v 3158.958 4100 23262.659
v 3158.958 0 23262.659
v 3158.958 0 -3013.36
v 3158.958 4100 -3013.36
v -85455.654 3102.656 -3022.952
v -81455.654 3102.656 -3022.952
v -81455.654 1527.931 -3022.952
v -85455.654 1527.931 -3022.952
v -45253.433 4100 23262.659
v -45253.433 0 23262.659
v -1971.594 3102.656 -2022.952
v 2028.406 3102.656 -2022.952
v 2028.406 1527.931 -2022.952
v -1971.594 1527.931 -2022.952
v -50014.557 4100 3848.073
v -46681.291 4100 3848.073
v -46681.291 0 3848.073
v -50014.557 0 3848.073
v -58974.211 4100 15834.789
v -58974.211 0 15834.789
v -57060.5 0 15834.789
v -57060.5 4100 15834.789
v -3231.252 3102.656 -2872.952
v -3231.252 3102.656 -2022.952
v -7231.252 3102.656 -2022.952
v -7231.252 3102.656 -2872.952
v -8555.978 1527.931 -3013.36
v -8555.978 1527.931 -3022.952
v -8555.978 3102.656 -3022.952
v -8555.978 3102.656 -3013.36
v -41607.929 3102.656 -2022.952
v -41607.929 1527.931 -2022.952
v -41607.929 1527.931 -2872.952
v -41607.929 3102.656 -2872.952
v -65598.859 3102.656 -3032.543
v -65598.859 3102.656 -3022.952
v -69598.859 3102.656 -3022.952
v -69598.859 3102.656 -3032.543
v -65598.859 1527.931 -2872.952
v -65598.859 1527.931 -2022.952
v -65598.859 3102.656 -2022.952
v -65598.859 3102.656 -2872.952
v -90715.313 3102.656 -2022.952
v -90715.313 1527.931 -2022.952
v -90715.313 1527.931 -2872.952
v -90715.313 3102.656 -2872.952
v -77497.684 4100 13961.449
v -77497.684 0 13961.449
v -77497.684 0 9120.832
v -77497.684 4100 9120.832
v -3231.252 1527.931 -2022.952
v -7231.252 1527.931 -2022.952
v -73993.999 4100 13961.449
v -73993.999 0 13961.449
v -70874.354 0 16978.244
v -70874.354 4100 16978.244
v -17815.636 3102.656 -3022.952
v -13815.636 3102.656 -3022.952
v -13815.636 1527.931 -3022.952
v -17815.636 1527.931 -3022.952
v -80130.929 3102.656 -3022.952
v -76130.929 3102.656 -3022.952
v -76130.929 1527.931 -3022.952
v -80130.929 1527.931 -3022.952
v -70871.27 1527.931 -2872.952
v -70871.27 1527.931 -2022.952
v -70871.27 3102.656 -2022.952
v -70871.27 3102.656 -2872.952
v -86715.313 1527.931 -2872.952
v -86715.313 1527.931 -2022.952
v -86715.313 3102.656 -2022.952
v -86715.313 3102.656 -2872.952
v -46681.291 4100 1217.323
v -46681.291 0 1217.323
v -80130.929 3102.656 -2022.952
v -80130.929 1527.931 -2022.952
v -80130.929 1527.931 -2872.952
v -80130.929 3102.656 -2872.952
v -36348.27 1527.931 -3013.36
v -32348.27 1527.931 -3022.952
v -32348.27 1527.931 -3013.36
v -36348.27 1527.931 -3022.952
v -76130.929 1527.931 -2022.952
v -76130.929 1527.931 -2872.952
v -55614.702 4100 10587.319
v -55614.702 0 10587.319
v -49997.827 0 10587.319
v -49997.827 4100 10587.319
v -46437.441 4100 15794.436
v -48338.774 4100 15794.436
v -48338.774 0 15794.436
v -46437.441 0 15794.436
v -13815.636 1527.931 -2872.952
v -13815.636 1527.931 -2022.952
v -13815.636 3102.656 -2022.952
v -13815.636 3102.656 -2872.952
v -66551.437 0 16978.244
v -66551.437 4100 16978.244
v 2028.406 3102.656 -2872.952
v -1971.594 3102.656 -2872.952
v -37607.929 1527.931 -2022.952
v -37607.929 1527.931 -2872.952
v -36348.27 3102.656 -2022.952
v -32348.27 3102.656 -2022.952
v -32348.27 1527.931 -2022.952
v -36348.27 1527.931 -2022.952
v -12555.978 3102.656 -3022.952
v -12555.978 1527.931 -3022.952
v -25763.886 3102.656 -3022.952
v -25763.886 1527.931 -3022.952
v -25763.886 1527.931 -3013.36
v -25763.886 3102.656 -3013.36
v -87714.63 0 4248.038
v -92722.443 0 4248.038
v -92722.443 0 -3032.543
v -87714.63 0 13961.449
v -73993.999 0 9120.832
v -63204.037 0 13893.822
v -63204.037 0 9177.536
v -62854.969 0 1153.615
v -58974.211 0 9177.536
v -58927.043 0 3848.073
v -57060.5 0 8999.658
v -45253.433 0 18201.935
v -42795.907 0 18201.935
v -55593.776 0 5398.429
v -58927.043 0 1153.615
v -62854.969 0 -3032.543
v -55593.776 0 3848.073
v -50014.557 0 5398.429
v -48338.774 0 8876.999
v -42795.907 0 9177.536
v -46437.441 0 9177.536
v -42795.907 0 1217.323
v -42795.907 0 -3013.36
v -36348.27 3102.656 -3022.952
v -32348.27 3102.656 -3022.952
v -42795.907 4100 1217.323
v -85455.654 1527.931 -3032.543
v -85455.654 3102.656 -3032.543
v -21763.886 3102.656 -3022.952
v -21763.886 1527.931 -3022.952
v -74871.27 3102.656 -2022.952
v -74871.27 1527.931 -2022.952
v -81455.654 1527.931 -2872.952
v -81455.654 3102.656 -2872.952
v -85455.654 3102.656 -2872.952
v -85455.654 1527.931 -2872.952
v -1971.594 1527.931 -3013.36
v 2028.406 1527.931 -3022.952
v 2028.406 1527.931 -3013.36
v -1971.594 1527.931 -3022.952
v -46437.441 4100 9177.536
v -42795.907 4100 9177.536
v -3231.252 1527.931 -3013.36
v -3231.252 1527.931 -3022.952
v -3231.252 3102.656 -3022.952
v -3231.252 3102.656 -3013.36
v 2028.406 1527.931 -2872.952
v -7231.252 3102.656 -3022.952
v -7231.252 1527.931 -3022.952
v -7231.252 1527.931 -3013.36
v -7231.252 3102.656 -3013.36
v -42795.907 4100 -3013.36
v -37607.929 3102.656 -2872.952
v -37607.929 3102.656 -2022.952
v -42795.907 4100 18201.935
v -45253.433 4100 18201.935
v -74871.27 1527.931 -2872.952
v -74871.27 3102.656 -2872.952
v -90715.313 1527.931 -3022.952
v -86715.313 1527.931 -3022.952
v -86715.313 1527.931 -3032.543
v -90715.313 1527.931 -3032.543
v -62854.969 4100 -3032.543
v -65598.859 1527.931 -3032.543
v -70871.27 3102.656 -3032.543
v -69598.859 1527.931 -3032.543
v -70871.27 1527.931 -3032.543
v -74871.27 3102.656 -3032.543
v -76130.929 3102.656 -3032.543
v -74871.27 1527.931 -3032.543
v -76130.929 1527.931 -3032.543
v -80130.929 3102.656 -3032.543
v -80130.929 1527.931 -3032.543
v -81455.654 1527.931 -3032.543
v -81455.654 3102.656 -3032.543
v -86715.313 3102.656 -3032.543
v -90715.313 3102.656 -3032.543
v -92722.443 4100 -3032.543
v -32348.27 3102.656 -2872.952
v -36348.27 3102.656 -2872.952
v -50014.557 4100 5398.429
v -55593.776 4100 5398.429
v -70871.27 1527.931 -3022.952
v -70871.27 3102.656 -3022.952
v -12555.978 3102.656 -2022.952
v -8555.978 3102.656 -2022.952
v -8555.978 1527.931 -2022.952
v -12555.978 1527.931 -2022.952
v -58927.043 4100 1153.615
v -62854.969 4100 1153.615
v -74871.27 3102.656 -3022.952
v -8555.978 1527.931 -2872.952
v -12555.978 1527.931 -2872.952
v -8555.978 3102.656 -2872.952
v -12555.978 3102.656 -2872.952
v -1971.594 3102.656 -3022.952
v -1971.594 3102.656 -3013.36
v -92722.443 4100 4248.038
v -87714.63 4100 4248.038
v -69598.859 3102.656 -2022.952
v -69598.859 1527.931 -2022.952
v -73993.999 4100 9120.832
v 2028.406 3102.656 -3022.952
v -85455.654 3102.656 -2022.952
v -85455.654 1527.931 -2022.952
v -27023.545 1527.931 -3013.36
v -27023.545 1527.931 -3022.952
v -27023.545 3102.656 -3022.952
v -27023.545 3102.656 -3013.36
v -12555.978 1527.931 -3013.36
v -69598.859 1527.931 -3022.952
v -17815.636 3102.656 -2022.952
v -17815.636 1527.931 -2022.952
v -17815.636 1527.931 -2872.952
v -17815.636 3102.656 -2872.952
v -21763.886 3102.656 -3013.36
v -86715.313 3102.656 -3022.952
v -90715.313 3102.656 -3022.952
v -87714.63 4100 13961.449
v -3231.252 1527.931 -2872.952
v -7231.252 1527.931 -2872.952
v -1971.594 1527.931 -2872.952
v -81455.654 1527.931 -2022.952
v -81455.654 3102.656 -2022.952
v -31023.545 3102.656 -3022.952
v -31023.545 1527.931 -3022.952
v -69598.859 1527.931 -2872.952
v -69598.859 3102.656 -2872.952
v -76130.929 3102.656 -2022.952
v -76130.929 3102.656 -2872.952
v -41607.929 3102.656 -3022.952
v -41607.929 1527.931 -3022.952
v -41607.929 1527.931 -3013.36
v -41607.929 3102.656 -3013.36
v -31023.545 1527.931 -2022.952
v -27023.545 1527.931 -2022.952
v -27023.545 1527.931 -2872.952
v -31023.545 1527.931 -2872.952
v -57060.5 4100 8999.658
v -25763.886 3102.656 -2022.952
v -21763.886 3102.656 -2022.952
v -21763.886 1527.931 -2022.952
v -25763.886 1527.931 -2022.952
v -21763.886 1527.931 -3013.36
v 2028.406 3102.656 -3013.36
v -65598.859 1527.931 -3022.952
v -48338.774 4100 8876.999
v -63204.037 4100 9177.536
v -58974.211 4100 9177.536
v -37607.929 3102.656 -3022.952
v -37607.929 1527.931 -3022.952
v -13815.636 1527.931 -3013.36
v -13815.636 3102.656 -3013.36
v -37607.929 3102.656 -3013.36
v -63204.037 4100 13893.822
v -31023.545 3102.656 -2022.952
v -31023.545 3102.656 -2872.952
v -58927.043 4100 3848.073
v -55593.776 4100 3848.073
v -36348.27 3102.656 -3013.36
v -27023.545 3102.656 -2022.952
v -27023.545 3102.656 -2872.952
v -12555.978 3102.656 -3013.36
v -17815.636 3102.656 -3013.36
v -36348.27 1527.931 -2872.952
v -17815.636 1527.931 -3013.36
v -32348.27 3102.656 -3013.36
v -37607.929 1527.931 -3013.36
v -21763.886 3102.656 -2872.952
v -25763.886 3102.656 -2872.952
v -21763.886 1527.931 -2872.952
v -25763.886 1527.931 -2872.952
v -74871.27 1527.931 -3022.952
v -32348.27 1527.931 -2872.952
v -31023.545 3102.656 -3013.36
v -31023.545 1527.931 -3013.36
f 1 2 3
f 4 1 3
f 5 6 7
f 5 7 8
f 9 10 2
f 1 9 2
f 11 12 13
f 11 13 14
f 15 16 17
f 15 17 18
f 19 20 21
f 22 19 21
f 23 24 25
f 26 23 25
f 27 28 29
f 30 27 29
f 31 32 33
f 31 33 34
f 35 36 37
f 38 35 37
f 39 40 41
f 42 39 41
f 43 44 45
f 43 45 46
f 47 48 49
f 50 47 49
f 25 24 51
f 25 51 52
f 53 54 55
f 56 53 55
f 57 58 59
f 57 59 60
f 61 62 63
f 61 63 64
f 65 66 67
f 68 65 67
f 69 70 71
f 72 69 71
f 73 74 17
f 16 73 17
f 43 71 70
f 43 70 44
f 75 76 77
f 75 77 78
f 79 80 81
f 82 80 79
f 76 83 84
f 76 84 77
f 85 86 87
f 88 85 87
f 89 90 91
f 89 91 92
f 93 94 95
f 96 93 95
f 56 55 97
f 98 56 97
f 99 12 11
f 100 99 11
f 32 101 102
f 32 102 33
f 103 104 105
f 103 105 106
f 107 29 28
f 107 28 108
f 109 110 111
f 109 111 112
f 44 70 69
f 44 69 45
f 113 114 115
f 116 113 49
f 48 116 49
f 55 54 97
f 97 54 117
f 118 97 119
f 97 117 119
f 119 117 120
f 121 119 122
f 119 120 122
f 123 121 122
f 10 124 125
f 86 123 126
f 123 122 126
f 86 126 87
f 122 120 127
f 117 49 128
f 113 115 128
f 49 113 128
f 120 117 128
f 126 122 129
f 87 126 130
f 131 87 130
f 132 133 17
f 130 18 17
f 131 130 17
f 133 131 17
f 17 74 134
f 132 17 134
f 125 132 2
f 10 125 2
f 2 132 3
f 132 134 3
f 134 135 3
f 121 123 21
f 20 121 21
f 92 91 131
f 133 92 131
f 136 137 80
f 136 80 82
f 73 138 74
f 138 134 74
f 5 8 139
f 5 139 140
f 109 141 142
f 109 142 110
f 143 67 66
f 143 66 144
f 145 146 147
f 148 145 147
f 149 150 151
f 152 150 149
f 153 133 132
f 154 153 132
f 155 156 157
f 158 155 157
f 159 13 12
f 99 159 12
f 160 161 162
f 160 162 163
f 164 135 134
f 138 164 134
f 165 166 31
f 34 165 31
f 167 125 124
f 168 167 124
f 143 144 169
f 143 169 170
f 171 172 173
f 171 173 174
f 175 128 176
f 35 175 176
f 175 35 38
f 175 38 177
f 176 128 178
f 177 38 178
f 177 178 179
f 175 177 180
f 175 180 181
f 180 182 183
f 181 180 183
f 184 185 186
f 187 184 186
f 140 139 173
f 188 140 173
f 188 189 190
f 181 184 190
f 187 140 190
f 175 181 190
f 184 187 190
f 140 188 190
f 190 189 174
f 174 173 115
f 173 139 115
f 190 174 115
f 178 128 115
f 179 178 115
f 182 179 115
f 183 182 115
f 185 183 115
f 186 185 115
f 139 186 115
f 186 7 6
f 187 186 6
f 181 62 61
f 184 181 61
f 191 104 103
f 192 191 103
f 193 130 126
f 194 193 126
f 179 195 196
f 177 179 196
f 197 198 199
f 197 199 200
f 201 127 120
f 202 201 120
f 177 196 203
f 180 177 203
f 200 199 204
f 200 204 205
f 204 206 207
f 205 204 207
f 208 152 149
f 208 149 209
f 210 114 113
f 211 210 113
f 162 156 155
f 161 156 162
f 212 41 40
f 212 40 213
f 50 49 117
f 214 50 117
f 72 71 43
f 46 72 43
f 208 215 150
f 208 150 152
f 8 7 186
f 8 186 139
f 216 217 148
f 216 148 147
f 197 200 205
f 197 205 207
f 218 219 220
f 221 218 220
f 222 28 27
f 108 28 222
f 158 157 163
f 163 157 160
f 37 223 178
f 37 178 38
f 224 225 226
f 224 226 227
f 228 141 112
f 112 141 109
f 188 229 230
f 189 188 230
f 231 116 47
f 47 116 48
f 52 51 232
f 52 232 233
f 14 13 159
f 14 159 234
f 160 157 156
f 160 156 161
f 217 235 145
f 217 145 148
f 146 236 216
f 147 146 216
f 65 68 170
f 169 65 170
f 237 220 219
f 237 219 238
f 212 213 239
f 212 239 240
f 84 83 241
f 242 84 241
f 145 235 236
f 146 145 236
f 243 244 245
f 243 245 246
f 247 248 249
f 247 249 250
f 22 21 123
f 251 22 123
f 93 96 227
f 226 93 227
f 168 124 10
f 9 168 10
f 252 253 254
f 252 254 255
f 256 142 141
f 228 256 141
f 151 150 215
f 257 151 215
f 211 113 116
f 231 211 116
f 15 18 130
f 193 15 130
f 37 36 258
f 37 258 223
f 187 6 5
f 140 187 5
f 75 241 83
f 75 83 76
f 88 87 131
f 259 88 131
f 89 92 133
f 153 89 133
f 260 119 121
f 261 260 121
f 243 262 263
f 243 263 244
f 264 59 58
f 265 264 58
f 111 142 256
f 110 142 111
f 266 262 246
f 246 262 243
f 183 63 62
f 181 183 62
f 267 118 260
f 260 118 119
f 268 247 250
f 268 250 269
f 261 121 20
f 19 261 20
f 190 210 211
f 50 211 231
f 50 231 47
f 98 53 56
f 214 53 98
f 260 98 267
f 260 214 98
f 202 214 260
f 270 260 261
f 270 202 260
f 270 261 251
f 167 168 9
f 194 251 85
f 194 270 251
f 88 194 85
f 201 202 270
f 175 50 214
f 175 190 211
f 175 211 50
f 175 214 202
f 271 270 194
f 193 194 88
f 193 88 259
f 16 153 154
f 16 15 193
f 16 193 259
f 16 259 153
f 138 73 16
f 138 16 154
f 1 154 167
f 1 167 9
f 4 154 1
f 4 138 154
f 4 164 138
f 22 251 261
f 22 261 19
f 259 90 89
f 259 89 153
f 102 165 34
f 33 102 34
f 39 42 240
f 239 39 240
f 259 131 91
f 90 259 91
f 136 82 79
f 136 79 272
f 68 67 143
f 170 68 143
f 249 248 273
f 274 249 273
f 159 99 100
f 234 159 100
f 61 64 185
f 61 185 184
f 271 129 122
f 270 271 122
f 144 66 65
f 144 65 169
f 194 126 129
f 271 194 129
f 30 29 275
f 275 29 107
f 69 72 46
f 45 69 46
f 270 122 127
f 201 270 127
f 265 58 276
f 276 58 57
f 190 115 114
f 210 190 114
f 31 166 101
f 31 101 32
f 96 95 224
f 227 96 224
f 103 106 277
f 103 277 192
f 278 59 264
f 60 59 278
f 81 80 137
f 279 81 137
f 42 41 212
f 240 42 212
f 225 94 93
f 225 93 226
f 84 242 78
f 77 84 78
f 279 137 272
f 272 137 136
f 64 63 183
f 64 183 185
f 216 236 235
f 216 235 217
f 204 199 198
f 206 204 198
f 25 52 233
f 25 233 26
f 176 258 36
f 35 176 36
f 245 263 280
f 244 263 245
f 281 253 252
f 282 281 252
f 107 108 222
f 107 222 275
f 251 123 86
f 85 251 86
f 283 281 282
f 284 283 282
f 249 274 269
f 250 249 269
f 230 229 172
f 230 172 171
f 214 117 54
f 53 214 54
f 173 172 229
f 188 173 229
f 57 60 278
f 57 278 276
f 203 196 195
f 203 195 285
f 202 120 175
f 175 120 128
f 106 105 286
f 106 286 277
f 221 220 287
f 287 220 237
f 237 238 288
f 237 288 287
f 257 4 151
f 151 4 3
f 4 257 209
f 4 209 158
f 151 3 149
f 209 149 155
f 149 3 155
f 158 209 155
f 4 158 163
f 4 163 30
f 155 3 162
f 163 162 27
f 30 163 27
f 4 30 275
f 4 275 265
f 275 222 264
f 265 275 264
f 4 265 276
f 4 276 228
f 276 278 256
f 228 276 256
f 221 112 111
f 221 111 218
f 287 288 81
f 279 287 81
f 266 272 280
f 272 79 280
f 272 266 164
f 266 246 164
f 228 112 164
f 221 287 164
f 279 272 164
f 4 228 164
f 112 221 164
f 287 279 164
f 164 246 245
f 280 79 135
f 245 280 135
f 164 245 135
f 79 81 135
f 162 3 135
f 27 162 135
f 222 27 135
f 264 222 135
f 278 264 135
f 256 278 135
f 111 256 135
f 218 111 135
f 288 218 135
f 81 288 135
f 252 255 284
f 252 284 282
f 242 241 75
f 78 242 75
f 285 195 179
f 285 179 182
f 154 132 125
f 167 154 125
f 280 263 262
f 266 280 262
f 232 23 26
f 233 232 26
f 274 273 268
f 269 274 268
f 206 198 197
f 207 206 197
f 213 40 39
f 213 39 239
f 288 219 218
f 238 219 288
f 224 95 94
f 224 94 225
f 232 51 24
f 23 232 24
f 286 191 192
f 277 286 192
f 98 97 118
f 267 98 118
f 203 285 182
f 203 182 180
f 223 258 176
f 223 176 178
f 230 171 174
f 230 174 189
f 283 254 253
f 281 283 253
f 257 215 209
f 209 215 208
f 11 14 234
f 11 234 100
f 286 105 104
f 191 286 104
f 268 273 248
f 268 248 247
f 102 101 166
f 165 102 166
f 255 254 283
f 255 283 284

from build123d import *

# Parameters (mm, degrees)
BOSS_EXTRUDE1_DEPTH     = 4100
CUT_EXTRUDE2_DEPTH      = 360
CUT_EXTRUDE2_DEPTH_BACK = 1000
SKETCH8_W               = 4000
SKETCH8_H               = 1574.725224171
BOSS_EXTRUDE2_DEPTH     = 400
SKETCH10_W              = 4000
SKETCH10_H              = 1574.725224171
BOSS_EXTRUDE3_DEPTH     = 150


with BuildPart() as part:
    # Sketch5 → Boss-Extrude1 (new body)
    with BuildSketch(Plane(origin=(0, 0, 0), x_dir=(1, 0, 0), z_dir=(0, 1, 0))):
        Polygon((-92722.442891537, 3032.5434193), (-92722.442891537, -4248.037983208), (-87714.630252684, -4248.037983208), (-87714.630252684, -13961.448907134), (-77497.684007523, -13961.448907134), (-77497.684007523, -9120.831801635), (-73993.999245447, -9120.831801635), (-73993.999245447, -13961.448907134), (-70874.353647814, -16978.243851345), (-66551.436516177, -16978.243851345), (-63204.037171957, -13893.822161368), (-63204.037171957, -9177.535874451), (-58974.210587207, -9177.535874451), (-58974.210587207, -15834.789027484), (-57060.499737676, -15834.789027484), (-57060.499737676, -8999.658062996), (-55614.702387222, -10587.318993272), (-49997.826624289, -10587.318993272), (-48338.773974021, -8876.998824422), (-48338.773974021, -15794.435779887), (-46437.441187314, -15794.435779887), (-46437.441187314, -9177.535874451), (-42795.906953804, -9177.535874451), (-42795.906953804, -18201.935134033), (-45253.433289974, -18201.935134033), (-45253.433289974, -23262.658838668), (3158.957531363, -23262.658838668), (3158.957531363, 3013.360006537), (-42795.906953804, 3013.360006537), (-42795.906953804, -1217.323428695), (-46681.290684555, -1217.323428695), (-46681.290684555, -3848.072569742), (-50014.557417966, -3848.072569742), (-50014.557417966, -5398.429189933), (-55593.77624448, -5398.429189933), (-55593.77624448, -3848.072569742), (-58927.042977891, -3848.072569742), (-58927.042977891, -1153.615193648), (-62854.969491775, -1153.615193648), (-62854.969491775, 3032.5434193), align=None)
    extrude(amount=BOSS_EXTRUDE1_DEPTH)

    # Sketch8 → Cut-Extrude2 (cut, two sides: drawn at the far end of the back side and taken through both)
    with BuildSketch(Plane(origin=(0, 0, -3022.951712918), x_dir=(-1, 0, 0), z_dir=(0, 0, -1)).offset(-CUT_EXTRUDE2_DEPTH_BACK)):
        with Locations((5231.252465647, 2315.293735901)):
            Rectangle(SKETCH8_W, SKETCH8_H)
        with Locations((-28.405935853, 2315.293735901)):
            Rectangle(SKETCH8_W, SKETCH8_H)
        with Locations((15815.636386773, 2315.293735901)):
            Rectangle(SKETCH8_W, SKETCH8_H)
        with Locations((10555.977985272, 2315.293735901)):
            Rectangle(SKETCH8_W, SKETCH8_H)
        with Locations((23763.886231613, 2315.293735901)):
            Rectangle(SKETCH8_W, SKETCH8_H)
        with Locations((39607.928554239, 2315.293735901)):
            Rectangle(SKETCH8_W, SKETCH8_H)
        with Locations((29023.544633113, 2315.293735901)):
            Rectangle(SKETCH8_W, SKETCH8_H)
        with Locations((34348.270152738, 2315.293735901)):
            Rectangle(SKETCH8_W, SKETCH8_H)
        with Locations((72871.270372947, 2315.293735901)):
            Rectangle(SKETCH8_W, SKETCH8_H)
        with Locations((83455.654294073, 2315.293735901)):
            Rectangle(SKETCH8_W, SKETCH8_H)
        with Locations((88715.312695573, 2315.293735901)):
            Rectangle(SKETCH8_W, SKETCH8_H)
        with Locations((78130.928774448, 2315.293735901)):
            Rectangle(SKETCH8_W, SKETCH8_H)
        with Locations((67598.858524863, 2315.293735901)):
            Rectangle(SKETCH8_W, SKETCH8_H)
    extrude(amount=CUT_EXTRUDE2_DEPTH + CUT_EXTRUDE2_DEPTH_BACK, mode=Mode.SUBTRACT)

    # Sketch11 → Boss-Extrude2 (add)
    with BuildSketch(Plane(origin=(0, 4100, 0), x_dir=(1, 0, 0), z_dir=(0, 1, 0))):
        Polygon((-92722.442891537, 3032.5434193), (-92722.442891537, -4248.037983208), (-87714.630252684, -4248.037983208), (-87714.630252684, -13961.448907134), (-77497.684007523, -13961.448907134), (-77497.684007523, -9120.831801635), (-73993.999245447, -9120.831801635), (-73993.999245447, -13961.448907134), (-70874.353647814, -16978.243851345), (-66551.436516177, -16978.243851345), (-63204.037171957, -13893.822161368), (-63204.037171957, -9177.535874451), (-58974.210587207, -9177.535874451), (-58974.210587207, -15834.789027484), (-57060.499737676, -15834.789027484), (-57060.499737676, -8999.658062996), (-55614.702387222, -10587.318993272), (-49997.826624289, -10587.318993272), (-48338.773974021, -8876.998824422), (-48338.773974021, -15794.435779887), (-46437.441187314, -15794.435779887), (-46437.441187314, -9177.535874451), (-42795.906953804, -9177.535874451), (-42795.906953804, -18201.935134033), (-45253.433289974, -18201.935134033), (-45253.433289974, -23262.658838668), (3158.957531363, -23262.658838668), (3158.957531363, 3013.360006537), (-42795.906953804, 3013.360006537), (-42795.906953804, -1217.323428695), (-44543.949233842, -1217.323428695), (-46460.002030968, -1217.323428695), (-46460.002030968, -4121.47924984), (-49725.652353067, -4121.47924984), (-49725.652353067, -5665.367364151), (-55960.882280047, -5665.367364151), (-55960.882280047, -4121.47924984), (-59226.532602146, -4121.47924984), (-59226.532602146, -1153.615193648), (-61139.275030104, -1153.615193648), (-62854.969491775, -1153.615193648), (-62854.969491775, 3032.5434193), align=None)
        with BuildLine():
            Line((-62020.014054855, -5163.687596874), (-62020.014054855, -5388.888998251))
            Line((-62020.014054855, -5388.888998251), (-61911.509537571, -5388.888998251))
            Line((-61911.509537571, -5388.888998251), (-61911.509537571, -5437.542435503))
            Line((-61911.509537571, -5437.542435503), (-61719.175469751, -5437.542435503))
            Line((-61719.175469751, -5437.542435503), (-61719.175469751, -5388.888998251))
            Line((-61719.175469751, -5388.888998251), (-61612.078613853, -5388.888998251))
            Line((-61612.078613853, -5388.888998251), (-61612.078613853, -5163.687596874))
            ThreePointArc((-61612.078613853, -5163.687596874), (-61626.723274794, -5128.332257815), (-61662.078613853, -5113.687596874))
            Line((-61662.078613853, -5113.687596874), (-61970.014054855, -5113.687596874))
            ThreePointArc((-61970.014054855, -5113.687596874), (-62005.369393914, -5128.332257815), (-62020.014054855, -5163.687596874))
        make_face(mode=Mode.SUBTRACT)
    extrude(amount=-BOSS_EXTRUDE2_DEPTH)

    # Sketch10 → Boss-Extrude3 (add)
    with BuildSketch(Plane(origin=(0, 0, -3022.951712918), x_dir=(-1, 0, 0), z_dir=(0, 0, -1))):
        with Locations((5231.252465647, 2315.293735901)):
            Rectangle(SKETCH10_W, SKETCH10_H)
        with Locations((-28.405935853, 2315.293735901)):
            Rectangle(SKETCH10_W, SKETCH10_H)
        with Locations((15815.636386773, 2315.293735901)):
            Rectangle(SKETCH10_W, SKETCH10_H)
        with Locations((10555.977985272, 2315.293735901)):
            Rectangle(SKETCH10_W, SKETCH10_H)
        with Locations((23763.886231613, 2315.293735901)):
            Rectangle(SKETCH10_W, SKETCH10_H)
        with Locations((39607.928554239, 2315.293735901)):
            Rectangle(SKETCH10_W, SKETCH10_H)
        with Locations((29023.544633113, 2315.293735901)):
            Rectangle(SKETCH10_W, SKETCH10_H)
        with Locations((34348.270152738, 2315.293735901)):
            Rectangle(SKETCH10_W, SKETCH10_H)
        with Locations((72871.270372947, 2315.293735901)):
            Rectangle(SKETCH10_W, SKETCH10_H)
        with Locations((83455.654294073, 2315.293735901)):
            Rectangle(SKETCH10_W, SKETCH10_H)
        with Locations((88715.312695573, 2315.293735901)):
            Rectangle(SKETCH10_W, SKETCH10_H)
        with Locations((78130.928774448, 2315.293735901)):
            Rectangle(SKETCH10_W, SKETCH10_H)
        with Locations((67598.858524863, 2315.293735901)):
            Rectangle(SKETCH10_W, SKETCH10_H)
    extrude(amount=-BOSS_EXTRUDE3_DEPTH)


solid = part.part
